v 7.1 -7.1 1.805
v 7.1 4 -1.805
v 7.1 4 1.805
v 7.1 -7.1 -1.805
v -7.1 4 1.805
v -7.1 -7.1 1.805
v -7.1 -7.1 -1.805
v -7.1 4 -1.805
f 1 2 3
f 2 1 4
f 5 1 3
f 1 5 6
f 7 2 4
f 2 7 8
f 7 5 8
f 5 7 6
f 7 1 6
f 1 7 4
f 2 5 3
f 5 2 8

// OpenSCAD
plate_thickness = 1;
plate_size = 15.6;
edge_offset = 1;
bottom_height = 5;
bottom_size = plate_size - 2;

top_height = 11.6;

switch_height = 3.0;
switch_thick = 1;
switch_width = 5;
switch_length = 3;

cap_height = .38*25.4;
cap_heightShift = 0.69*25.4;
cap_width = 18.3;

clip_Length = 3;  // length clipped

//dummy key switch with caps to check position
module Switch(switchScale= [1,1,1], colors = "teal", clipLength = 0, type = "")
{
  difference(){
    union(){
      translate([0,0,1.75]){
        difference(){
          translate([0,0,0.5])cube([15,15,1], center = true);
          //cuts
      //    translate([15/2-1/2,0,.5])cube([1,10.5,2], center = true);
      //    translate([-15/2+1/2,0,.5])cube([1,10.5,2], center = true);
        }

        translate([0,0,1.5])cube([13,13,2], center = true);
        color("springGreen")translate([0,0,4])cube([11.4,4,3], center = true);
        color("springGreen")translate([0,1,4])cube([3,5,3], center = true);
        color("DarkSlateGray")translate([0,0,-1])cube([13,14,2,],center = true);
        color("DarkSlateGray")translate([0,0,-2-2.5])cylinder(d=3.3, 2.5);
        color("DarkSlateGray")translate([5,0,-2-2.5])cylinder(d=1.6, 2.5); 
        color("DarkSlateGray")translate([-5,0,-2-2.5])cylinder(d=1.6, 2.5); 

        //cap
        color("ivory")hull(){
          translate([0,0,4.5+1])cube([17.5,16.8,2],center = true);
          translate([0,1.25,4.5+1+1.5])cube([14.5,12.5,1.5],center = true);
        }
      }
    }
    if (clipLength != 0){ // commiting unholy act in name of ergonomics
      translate([0, -sign(clipLength)*7.8-clipLength,  0])cube([20, 15.6, 40], center = true);
    }
  }
}

module Cutter()
{
  bottom_height = 4.5;
  bottom_chamfer_width = 3;
  bottom_chamfer_height =  1;
  bottom_chamfer_thickness = .6;

  bottom_peg_diameter = 4;
  bottom_peg_height =  3;
  bottom_peg_chamfer = 1;
  bottom_peg_side_scale = 1.7/4;

  translate([-bottom_size/2, -bottom_size/2 ,0])cube([bottom_size,bottom_size,bottom_height]);

  translate([0,0, -(bottom_peg_height -bottom_peg_chamfer)]){
    cylinder(d=bottom_peg_diameter, h= bottom_peg_height -bottom_peg_chamfer);
    translate([5,0,0])scale(v=[bottom_peg_side_scale,bottom_peg_side_scale,1])cylinder(d=bottom_peg_diameter, h= bottom_peg_height -bottom_peg_chamfer);
    translate([-5,0,0])scale(v=[bottom_peg_side_scale,bottom_peg_side_scale,1])cylinder(d=bottom_peg_diameter, h= bottom_peg_height -bottom_peg_chamfer);

    translate([0,0, -bottom_peg_chamfer]){
      cylinder(d2=bottom_peg_diameter , d1 = bottom_peg_diameter -2*bottom_peg_chamfer, h= bottom_peg_chamfer);
      translate([5,0,0])scale(v=[bottom_peg_side_scale,bottom_peg_side_scale,1])cylinder(d2=bottom_peg_diameter , d1 = bottom_peg_diameter -2*bottom_peg_chamfer, h= bottom_peg_chamfer);
      translate([-5,0,0])scale(v=[bottom_peg_side_scale,bottom_peg_side_scale,1])cylinder(d2=bottom_peg_diameter , d1 = bottom_peg_diameter -2*bottom_peg_chamfer, h= bottom_peg_chamfer);
    }
  }
}

//MX series keyhole
// TODO: add alps support?
module Keyhole(tol = .1, cutThickness = .5, clipLength = 0)
{
  $fn = 10;
  bottom_length = 13.9+tol;
   plate_thickness = 3.51; //mm
  holeLength = bottom_length+tol*2;
  //latch nibs
  nib_radius= 1;
  nib_length = 3;

  translate([0,0,-1.25])difference(){
    union(){
      translate([0,0,1.25])cube([holeLength, holeLength, plate_thickness+tol], center =true);
//      translate([0,0,.25-cutThickness/2])cube([holeLength+1, holeLength+1, plate_thickness+cutThickness], center =true);  
    }
    
    union(){
      if (clipLength != 0){
        translate([0, -sign(clipLength)*7.8-clipLength, 0])cube([20, 15.6, 40], center = true);
      }
    }
  }
}

module Stabilizer(offsets = 23.8/2)
{
  plate_thickness = 3.6; //mm
  stabilizer_width = 5;
  stabilizer_length = 12.2;
  translate([offsets,0,0])cube([stabilizer_width,stabilizer_length,plate_thickness], center = true);
  translate([-offsets,0,0])cube([stabilizer_width,stabilizer_length,plate_thickness], center = true);
}

module TrackPoint(nibLength = 20)
{
  color("red")translate([0,0,-.5])cube([4.5,4.5,5], center= true); //nib
  color("gold")cylinder(d = 2, nibLength); //nib
  color("gold")translate([0,0,nibLength])sphere(2); //nib
  translate([0,30.3/2-8,-3/2])cube([26.46, 30.3, 3], center = true);
}

module RotaryEncoder(stemLength = 13, Wheel = 0)
{
 color("grey")translate([0,0, -6.1/2])cube([11.5, 13.5, 6.1], center = true);
 cylinder(d = 7, 7.8);

 translate([0,0,7.8])difference(){
   cylinder(d = 5.8, stemLength);
   translate([-5.8/2,5.8/2-1.5,3])cube([11.5, 13.5, stemLength]);
 }
 color("grey")translate([0,0,7.8])cylinder(d = Wheel, stemLength);
}

//################ Test Calls ###################
//Switch(clipLength = -4);
Keyhole(.1, clipLength = -4);
//Stabilizer(20);
// RotaryEncoder(Wheel = 0);
//Switch([1,1.5,1]);
//TrackPoint();
